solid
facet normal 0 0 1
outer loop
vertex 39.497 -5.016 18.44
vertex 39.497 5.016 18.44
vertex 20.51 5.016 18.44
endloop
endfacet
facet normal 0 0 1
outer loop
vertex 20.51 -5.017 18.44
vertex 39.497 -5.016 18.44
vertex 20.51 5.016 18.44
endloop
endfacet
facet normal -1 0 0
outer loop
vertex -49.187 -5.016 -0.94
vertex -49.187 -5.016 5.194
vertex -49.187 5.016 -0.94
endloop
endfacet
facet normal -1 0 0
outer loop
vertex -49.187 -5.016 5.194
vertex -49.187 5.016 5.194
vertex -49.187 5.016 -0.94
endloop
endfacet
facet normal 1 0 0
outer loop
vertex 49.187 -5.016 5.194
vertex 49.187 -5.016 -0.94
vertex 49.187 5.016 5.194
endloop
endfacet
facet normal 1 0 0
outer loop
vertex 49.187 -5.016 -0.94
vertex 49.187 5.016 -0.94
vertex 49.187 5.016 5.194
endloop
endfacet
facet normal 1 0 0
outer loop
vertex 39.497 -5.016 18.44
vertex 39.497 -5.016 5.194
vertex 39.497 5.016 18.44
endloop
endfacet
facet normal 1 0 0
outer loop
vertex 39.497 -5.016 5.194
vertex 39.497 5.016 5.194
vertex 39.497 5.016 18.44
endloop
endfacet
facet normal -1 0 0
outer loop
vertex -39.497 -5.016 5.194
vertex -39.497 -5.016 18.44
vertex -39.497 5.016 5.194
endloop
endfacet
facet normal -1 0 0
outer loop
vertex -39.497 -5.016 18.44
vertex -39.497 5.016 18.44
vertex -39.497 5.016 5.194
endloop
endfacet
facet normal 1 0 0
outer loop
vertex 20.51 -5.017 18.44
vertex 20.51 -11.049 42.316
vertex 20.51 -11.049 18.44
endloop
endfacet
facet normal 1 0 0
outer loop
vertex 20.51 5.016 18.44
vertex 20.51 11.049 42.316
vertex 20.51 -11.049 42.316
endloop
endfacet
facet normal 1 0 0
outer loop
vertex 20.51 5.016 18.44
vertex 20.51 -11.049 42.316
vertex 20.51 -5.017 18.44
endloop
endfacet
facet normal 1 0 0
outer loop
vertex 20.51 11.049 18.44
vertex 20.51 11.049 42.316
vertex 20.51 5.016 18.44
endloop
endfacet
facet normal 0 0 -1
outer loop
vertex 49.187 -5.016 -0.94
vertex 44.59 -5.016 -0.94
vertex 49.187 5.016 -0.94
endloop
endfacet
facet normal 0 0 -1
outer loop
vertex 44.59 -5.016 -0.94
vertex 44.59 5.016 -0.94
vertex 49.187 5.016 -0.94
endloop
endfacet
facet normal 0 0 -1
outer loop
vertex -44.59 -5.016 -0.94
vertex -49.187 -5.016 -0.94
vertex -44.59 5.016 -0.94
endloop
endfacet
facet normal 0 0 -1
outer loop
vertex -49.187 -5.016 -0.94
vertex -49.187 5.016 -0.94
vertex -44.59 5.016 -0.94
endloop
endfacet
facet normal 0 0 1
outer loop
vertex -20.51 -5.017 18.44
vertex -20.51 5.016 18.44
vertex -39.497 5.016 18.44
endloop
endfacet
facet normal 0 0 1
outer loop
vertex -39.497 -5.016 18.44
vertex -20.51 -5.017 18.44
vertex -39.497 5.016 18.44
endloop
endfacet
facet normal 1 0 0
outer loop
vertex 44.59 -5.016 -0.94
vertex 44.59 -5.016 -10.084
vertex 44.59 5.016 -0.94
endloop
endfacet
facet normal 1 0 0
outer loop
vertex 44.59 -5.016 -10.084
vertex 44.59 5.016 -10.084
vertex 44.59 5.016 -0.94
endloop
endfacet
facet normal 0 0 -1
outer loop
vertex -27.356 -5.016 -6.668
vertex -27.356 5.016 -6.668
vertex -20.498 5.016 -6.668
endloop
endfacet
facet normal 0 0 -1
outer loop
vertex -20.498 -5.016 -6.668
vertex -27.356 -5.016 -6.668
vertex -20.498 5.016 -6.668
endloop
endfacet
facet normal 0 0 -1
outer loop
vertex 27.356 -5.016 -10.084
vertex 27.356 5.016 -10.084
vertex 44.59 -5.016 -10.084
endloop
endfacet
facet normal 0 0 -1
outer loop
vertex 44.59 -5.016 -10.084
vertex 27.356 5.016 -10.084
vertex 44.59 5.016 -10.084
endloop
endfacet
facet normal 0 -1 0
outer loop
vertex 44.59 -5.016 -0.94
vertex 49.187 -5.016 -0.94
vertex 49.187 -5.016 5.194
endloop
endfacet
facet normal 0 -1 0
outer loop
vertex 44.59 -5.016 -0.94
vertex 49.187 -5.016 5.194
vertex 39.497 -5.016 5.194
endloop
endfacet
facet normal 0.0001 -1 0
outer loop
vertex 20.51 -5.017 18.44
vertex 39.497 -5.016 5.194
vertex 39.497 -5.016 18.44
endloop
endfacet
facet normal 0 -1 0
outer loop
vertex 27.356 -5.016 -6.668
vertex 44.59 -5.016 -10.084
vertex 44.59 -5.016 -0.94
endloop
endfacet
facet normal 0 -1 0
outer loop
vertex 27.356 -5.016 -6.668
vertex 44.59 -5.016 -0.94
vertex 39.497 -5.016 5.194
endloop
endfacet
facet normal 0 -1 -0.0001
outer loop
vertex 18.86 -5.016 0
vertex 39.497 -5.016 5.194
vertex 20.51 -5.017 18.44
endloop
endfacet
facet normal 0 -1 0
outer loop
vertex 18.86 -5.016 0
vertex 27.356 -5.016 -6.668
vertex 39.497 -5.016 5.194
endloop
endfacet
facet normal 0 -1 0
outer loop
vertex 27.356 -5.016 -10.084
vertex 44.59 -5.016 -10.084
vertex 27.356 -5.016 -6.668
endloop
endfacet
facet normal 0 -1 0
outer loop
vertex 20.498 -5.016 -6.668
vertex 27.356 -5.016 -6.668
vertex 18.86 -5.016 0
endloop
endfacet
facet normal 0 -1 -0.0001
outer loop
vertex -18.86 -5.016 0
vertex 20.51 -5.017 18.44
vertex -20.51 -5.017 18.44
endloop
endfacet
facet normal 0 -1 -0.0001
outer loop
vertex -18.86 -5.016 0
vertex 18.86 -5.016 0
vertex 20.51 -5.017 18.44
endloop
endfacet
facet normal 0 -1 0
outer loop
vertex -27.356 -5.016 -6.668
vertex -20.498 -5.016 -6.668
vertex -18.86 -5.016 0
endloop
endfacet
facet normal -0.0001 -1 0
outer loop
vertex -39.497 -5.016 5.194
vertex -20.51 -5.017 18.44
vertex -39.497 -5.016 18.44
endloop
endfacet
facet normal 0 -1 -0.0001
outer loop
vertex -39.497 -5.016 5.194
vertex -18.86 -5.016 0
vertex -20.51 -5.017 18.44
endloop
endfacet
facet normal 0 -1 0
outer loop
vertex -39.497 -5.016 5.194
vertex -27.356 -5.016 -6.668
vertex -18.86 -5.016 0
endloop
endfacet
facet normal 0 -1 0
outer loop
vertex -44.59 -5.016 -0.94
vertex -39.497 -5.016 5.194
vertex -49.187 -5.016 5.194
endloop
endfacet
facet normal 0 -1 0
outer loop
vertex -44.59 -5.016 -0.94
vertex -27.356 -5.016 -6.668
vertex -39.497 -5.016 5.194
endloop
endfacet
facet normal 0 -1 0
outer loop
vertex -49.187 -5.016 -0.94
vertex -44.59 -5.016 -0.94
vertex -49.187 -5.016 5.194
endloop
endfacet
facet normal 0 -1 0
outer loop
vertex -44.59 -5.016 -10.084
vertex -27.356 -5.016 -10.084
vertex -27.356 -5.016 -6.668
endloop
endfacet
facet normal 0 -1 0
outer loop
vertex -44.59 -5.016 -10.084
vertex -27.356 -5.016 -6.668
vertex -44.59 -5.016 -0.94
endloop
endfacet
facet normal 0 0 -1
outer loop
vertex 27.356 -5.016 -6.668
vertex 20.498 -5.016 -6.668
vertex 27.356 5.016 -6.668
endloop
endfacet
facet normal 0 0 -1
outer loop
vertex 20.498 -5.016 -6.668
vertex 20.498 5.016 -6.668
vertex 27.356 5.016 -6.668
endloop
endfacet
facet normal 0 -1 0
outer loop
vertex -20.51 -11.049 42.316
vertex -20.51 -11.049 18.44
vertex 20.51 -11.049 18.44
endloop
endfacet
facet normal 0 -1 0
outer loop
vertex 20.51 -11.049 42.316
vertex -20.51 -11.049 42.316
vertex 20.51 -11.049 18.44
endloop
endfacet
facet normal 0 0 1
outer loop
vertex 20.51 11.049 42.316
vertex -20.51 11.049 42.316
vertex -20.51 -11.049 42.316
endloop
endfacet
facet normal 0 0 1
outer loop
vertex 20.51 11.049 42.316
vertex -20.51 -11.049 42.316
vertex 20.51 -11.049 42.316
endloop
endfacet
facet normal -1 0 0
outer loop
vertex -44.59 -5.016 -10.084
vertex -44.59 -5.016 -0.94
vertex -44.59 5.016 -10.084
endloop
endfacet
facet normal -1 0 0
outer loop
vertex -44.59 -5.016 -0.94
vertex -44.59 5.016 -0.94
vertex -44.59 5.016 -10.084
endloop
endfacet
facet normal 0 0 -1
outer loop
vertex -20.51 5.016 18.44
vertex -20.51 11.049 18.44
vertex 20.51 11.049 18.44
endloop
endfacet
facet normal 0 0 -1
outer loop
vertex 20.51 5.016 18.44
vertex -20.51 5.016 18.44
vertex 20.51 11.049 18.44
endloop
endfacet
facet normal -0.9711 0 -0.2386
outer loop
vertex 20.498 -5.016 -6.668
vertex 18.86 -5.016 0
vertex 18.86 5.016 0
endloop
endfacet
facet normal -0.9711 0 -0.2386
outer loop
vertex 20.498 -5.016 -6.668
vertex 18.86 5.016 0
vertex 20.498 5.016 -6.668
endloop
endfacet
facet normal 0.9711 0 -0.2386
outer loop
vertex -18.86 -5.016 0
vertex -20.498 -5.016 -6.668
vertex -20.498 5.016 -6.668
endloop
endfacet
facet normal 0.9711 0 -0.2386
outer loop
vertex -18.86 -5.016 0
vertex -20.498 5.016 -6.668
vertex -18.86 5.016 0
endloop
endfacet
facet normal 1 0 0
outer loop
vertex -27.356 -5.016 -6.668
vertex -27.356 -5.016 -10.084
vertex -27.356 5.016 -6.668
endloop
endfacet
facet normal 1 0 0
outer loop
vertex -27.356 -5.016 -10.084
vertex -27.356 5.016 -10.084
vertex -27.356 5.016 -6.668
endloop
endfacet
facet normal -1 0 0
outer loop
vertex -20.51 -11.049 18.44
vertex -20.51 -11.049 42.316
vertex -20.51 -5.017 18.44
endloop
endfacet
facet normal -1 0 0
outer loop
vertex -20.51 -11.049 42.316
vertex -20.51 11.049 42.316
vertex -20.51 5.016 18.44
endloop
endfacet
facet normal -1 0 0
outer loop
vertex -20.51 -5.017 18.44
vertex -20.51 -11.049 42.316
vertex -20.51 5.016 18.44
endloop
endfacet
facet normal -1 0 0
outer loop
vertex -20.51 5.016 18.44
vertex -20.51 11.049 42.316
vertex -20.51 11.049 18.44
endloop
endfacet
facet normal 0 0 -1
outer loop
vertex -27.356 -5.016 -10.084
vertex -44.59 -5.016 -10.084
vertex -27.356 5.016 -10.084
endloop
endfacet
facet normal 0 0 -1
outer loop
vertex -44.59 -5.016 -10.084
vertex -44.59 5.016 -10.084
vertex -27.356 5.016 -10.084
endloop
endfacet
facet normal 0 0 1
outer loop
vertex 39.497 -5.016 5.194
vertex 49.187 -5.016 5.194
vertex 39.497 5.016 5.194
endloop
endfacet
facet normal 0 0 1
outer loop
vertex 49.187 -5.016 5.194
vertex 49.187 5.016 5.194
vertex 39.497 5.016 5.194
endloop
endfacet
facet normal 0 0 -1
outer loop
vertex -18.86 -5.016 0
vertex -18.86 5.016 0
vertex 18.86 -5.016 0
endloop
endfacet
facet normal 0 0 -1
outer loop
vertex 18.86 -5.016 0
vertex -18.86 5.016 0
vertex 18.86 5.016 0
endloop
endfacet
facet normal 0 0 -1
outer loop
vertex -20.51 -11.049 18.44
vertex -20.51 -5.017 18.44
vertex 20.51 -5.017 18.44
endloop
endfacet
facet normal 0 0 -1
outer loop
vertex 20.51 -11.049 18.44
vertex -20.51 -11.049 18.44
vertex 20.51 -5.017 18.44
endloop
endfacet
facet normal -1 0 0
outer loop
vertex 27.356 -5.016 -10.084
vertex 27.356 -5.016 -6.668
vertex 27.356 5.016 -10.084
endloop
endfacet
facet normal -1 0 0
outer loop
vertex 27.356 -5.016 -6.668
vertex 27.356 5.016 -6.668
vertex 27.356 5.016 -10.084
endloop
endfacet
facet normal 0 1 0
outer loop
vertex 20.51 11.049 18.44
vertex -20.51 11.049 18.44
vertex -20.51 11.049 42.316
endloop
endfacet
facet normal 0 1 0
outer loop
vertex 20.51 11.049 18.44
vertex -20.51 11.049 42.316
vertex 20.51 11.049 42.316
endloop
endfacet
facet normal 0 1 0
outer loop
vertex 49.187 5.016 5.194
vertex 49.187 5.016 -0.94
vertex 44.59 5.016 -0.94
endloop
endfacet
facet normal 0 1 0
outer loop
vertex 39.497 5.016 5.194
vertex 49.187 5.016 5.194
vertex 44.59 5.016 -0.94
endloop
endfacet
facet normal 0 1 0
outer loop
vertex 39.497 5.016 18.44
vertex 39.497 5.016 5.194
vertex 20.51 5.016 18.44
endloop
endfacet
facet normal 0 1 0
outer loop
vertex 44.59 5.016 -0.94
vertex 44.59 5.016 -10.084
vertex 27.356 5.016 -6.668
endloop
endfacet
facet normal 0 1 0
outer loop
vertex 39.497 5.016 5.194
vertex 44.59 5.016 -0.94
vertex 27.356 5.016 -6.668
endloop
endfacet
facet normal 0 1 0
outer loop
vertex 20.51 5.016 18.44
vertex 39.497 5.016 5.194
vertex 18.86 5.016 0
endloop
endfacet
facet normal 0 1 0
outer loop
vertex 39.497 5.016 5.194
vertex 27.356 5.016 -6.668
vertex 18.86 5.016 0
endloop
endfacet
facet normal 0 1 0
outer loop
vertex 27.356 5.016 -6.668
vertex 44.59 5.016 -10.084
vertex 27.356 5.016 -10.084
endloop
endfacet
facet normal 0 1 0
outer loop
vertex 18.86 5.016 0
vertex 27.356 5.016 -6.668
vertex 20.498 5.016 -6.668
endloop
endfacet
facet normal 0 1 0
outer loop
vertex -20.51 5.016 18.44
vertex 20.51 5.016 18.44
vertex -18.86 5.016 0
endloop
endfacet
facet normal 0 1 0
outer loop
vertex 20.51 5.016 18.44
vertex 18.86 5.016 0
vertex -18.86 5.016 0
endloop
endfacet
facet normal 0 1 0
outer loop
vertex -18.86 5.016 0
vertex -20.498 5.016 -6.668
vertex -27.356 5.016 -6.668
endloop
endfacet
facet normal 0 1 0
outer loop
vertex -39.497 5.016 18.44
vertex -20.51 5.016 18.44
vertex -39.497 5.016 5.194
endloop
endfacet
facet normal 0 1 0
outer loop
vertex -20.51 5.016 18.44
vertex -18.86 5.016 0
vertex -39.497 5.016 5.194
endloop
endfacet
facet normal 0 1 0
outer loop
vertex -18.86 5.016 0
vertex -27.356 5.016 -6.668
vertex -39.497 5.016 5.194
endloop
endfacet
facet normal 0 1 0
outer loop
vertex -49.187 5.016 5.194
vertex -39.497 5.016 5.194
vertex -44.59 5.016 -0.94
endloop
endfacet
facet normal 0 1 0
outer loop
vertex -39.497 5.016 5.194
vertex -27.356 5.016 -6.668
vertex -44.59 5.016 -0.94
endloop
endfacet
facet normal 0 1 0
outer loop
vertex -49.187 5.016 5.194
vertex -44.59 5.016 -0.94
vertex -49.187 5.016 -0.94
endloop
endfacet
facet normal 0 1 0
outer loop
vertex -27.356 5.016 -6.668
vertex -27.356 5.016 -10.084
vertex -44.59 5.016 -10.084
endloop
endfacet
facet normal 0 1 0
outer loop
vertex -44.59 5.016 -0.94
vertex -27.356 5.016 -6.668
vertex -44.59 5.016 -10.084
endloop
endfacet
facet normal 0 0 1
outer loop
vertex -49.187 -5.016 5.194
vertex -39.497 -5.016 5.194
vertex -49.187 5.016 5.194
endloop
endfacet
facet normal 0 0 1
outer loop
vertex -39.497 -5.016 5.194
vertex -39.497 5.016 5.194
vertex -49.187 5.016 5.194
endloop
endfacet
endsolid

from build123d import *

# Parameters (mm, degrees)
BOSS_EXTRUDE1_DEPTH = 5.0165
SKETCH2_W           = 41.021
SKETCH2_H           = 23.876
BOSS_EXTRUDE2_DEPTH = 11.049


with BuildPart() as part:
    # Sketch1 → Boss-Extrude1 (new, symmetric)
    with BuildSketch(Plane(origin=(0, 0, 0), x_dir=(1, 0, 0), z_dir=(0, 1, 0))):
        Polygon((-18.8595, 0), (18.8595, 0), (20.4978, 6.6675), (27.3558, 6.6675), (27.3558, 10.0838), (44.5897, 10.0838), (44.5897, 0.9398), (49.1871, 0.9398), (49.1871, -5.1943), (39.497, -5.1943), (39.497, -18.4404), (-39.497, -18.4404), (-39.497, -5.1943), (-49.1871, -5.1943), (-49.1871, 0.9398), (-44.5897, 0.9398), (-44.5897, 10.0838), (-27.3558, 10.0838), (-27.3558, 6.6675), (-20.4978, 6.6675), align=None)
    extrude(amount=BOSS_EXTRUDE1_DEPTH, both=True)

    # Sketch2 → Boss-Extrude2 (add, symmetric)
    with BuildSketch(Plane(origin=(0, 0, 0), x_dir=(1, 0, 0), z_dir=(0, 1, 0))):
        with Locations((0, -30.3784)):
            Rectangle(SKETCH2_W, SKETCH2_H)
    extrude(amount=BOSS_EXTRUDE2_DEPTH, both=True)


solid = part.part
